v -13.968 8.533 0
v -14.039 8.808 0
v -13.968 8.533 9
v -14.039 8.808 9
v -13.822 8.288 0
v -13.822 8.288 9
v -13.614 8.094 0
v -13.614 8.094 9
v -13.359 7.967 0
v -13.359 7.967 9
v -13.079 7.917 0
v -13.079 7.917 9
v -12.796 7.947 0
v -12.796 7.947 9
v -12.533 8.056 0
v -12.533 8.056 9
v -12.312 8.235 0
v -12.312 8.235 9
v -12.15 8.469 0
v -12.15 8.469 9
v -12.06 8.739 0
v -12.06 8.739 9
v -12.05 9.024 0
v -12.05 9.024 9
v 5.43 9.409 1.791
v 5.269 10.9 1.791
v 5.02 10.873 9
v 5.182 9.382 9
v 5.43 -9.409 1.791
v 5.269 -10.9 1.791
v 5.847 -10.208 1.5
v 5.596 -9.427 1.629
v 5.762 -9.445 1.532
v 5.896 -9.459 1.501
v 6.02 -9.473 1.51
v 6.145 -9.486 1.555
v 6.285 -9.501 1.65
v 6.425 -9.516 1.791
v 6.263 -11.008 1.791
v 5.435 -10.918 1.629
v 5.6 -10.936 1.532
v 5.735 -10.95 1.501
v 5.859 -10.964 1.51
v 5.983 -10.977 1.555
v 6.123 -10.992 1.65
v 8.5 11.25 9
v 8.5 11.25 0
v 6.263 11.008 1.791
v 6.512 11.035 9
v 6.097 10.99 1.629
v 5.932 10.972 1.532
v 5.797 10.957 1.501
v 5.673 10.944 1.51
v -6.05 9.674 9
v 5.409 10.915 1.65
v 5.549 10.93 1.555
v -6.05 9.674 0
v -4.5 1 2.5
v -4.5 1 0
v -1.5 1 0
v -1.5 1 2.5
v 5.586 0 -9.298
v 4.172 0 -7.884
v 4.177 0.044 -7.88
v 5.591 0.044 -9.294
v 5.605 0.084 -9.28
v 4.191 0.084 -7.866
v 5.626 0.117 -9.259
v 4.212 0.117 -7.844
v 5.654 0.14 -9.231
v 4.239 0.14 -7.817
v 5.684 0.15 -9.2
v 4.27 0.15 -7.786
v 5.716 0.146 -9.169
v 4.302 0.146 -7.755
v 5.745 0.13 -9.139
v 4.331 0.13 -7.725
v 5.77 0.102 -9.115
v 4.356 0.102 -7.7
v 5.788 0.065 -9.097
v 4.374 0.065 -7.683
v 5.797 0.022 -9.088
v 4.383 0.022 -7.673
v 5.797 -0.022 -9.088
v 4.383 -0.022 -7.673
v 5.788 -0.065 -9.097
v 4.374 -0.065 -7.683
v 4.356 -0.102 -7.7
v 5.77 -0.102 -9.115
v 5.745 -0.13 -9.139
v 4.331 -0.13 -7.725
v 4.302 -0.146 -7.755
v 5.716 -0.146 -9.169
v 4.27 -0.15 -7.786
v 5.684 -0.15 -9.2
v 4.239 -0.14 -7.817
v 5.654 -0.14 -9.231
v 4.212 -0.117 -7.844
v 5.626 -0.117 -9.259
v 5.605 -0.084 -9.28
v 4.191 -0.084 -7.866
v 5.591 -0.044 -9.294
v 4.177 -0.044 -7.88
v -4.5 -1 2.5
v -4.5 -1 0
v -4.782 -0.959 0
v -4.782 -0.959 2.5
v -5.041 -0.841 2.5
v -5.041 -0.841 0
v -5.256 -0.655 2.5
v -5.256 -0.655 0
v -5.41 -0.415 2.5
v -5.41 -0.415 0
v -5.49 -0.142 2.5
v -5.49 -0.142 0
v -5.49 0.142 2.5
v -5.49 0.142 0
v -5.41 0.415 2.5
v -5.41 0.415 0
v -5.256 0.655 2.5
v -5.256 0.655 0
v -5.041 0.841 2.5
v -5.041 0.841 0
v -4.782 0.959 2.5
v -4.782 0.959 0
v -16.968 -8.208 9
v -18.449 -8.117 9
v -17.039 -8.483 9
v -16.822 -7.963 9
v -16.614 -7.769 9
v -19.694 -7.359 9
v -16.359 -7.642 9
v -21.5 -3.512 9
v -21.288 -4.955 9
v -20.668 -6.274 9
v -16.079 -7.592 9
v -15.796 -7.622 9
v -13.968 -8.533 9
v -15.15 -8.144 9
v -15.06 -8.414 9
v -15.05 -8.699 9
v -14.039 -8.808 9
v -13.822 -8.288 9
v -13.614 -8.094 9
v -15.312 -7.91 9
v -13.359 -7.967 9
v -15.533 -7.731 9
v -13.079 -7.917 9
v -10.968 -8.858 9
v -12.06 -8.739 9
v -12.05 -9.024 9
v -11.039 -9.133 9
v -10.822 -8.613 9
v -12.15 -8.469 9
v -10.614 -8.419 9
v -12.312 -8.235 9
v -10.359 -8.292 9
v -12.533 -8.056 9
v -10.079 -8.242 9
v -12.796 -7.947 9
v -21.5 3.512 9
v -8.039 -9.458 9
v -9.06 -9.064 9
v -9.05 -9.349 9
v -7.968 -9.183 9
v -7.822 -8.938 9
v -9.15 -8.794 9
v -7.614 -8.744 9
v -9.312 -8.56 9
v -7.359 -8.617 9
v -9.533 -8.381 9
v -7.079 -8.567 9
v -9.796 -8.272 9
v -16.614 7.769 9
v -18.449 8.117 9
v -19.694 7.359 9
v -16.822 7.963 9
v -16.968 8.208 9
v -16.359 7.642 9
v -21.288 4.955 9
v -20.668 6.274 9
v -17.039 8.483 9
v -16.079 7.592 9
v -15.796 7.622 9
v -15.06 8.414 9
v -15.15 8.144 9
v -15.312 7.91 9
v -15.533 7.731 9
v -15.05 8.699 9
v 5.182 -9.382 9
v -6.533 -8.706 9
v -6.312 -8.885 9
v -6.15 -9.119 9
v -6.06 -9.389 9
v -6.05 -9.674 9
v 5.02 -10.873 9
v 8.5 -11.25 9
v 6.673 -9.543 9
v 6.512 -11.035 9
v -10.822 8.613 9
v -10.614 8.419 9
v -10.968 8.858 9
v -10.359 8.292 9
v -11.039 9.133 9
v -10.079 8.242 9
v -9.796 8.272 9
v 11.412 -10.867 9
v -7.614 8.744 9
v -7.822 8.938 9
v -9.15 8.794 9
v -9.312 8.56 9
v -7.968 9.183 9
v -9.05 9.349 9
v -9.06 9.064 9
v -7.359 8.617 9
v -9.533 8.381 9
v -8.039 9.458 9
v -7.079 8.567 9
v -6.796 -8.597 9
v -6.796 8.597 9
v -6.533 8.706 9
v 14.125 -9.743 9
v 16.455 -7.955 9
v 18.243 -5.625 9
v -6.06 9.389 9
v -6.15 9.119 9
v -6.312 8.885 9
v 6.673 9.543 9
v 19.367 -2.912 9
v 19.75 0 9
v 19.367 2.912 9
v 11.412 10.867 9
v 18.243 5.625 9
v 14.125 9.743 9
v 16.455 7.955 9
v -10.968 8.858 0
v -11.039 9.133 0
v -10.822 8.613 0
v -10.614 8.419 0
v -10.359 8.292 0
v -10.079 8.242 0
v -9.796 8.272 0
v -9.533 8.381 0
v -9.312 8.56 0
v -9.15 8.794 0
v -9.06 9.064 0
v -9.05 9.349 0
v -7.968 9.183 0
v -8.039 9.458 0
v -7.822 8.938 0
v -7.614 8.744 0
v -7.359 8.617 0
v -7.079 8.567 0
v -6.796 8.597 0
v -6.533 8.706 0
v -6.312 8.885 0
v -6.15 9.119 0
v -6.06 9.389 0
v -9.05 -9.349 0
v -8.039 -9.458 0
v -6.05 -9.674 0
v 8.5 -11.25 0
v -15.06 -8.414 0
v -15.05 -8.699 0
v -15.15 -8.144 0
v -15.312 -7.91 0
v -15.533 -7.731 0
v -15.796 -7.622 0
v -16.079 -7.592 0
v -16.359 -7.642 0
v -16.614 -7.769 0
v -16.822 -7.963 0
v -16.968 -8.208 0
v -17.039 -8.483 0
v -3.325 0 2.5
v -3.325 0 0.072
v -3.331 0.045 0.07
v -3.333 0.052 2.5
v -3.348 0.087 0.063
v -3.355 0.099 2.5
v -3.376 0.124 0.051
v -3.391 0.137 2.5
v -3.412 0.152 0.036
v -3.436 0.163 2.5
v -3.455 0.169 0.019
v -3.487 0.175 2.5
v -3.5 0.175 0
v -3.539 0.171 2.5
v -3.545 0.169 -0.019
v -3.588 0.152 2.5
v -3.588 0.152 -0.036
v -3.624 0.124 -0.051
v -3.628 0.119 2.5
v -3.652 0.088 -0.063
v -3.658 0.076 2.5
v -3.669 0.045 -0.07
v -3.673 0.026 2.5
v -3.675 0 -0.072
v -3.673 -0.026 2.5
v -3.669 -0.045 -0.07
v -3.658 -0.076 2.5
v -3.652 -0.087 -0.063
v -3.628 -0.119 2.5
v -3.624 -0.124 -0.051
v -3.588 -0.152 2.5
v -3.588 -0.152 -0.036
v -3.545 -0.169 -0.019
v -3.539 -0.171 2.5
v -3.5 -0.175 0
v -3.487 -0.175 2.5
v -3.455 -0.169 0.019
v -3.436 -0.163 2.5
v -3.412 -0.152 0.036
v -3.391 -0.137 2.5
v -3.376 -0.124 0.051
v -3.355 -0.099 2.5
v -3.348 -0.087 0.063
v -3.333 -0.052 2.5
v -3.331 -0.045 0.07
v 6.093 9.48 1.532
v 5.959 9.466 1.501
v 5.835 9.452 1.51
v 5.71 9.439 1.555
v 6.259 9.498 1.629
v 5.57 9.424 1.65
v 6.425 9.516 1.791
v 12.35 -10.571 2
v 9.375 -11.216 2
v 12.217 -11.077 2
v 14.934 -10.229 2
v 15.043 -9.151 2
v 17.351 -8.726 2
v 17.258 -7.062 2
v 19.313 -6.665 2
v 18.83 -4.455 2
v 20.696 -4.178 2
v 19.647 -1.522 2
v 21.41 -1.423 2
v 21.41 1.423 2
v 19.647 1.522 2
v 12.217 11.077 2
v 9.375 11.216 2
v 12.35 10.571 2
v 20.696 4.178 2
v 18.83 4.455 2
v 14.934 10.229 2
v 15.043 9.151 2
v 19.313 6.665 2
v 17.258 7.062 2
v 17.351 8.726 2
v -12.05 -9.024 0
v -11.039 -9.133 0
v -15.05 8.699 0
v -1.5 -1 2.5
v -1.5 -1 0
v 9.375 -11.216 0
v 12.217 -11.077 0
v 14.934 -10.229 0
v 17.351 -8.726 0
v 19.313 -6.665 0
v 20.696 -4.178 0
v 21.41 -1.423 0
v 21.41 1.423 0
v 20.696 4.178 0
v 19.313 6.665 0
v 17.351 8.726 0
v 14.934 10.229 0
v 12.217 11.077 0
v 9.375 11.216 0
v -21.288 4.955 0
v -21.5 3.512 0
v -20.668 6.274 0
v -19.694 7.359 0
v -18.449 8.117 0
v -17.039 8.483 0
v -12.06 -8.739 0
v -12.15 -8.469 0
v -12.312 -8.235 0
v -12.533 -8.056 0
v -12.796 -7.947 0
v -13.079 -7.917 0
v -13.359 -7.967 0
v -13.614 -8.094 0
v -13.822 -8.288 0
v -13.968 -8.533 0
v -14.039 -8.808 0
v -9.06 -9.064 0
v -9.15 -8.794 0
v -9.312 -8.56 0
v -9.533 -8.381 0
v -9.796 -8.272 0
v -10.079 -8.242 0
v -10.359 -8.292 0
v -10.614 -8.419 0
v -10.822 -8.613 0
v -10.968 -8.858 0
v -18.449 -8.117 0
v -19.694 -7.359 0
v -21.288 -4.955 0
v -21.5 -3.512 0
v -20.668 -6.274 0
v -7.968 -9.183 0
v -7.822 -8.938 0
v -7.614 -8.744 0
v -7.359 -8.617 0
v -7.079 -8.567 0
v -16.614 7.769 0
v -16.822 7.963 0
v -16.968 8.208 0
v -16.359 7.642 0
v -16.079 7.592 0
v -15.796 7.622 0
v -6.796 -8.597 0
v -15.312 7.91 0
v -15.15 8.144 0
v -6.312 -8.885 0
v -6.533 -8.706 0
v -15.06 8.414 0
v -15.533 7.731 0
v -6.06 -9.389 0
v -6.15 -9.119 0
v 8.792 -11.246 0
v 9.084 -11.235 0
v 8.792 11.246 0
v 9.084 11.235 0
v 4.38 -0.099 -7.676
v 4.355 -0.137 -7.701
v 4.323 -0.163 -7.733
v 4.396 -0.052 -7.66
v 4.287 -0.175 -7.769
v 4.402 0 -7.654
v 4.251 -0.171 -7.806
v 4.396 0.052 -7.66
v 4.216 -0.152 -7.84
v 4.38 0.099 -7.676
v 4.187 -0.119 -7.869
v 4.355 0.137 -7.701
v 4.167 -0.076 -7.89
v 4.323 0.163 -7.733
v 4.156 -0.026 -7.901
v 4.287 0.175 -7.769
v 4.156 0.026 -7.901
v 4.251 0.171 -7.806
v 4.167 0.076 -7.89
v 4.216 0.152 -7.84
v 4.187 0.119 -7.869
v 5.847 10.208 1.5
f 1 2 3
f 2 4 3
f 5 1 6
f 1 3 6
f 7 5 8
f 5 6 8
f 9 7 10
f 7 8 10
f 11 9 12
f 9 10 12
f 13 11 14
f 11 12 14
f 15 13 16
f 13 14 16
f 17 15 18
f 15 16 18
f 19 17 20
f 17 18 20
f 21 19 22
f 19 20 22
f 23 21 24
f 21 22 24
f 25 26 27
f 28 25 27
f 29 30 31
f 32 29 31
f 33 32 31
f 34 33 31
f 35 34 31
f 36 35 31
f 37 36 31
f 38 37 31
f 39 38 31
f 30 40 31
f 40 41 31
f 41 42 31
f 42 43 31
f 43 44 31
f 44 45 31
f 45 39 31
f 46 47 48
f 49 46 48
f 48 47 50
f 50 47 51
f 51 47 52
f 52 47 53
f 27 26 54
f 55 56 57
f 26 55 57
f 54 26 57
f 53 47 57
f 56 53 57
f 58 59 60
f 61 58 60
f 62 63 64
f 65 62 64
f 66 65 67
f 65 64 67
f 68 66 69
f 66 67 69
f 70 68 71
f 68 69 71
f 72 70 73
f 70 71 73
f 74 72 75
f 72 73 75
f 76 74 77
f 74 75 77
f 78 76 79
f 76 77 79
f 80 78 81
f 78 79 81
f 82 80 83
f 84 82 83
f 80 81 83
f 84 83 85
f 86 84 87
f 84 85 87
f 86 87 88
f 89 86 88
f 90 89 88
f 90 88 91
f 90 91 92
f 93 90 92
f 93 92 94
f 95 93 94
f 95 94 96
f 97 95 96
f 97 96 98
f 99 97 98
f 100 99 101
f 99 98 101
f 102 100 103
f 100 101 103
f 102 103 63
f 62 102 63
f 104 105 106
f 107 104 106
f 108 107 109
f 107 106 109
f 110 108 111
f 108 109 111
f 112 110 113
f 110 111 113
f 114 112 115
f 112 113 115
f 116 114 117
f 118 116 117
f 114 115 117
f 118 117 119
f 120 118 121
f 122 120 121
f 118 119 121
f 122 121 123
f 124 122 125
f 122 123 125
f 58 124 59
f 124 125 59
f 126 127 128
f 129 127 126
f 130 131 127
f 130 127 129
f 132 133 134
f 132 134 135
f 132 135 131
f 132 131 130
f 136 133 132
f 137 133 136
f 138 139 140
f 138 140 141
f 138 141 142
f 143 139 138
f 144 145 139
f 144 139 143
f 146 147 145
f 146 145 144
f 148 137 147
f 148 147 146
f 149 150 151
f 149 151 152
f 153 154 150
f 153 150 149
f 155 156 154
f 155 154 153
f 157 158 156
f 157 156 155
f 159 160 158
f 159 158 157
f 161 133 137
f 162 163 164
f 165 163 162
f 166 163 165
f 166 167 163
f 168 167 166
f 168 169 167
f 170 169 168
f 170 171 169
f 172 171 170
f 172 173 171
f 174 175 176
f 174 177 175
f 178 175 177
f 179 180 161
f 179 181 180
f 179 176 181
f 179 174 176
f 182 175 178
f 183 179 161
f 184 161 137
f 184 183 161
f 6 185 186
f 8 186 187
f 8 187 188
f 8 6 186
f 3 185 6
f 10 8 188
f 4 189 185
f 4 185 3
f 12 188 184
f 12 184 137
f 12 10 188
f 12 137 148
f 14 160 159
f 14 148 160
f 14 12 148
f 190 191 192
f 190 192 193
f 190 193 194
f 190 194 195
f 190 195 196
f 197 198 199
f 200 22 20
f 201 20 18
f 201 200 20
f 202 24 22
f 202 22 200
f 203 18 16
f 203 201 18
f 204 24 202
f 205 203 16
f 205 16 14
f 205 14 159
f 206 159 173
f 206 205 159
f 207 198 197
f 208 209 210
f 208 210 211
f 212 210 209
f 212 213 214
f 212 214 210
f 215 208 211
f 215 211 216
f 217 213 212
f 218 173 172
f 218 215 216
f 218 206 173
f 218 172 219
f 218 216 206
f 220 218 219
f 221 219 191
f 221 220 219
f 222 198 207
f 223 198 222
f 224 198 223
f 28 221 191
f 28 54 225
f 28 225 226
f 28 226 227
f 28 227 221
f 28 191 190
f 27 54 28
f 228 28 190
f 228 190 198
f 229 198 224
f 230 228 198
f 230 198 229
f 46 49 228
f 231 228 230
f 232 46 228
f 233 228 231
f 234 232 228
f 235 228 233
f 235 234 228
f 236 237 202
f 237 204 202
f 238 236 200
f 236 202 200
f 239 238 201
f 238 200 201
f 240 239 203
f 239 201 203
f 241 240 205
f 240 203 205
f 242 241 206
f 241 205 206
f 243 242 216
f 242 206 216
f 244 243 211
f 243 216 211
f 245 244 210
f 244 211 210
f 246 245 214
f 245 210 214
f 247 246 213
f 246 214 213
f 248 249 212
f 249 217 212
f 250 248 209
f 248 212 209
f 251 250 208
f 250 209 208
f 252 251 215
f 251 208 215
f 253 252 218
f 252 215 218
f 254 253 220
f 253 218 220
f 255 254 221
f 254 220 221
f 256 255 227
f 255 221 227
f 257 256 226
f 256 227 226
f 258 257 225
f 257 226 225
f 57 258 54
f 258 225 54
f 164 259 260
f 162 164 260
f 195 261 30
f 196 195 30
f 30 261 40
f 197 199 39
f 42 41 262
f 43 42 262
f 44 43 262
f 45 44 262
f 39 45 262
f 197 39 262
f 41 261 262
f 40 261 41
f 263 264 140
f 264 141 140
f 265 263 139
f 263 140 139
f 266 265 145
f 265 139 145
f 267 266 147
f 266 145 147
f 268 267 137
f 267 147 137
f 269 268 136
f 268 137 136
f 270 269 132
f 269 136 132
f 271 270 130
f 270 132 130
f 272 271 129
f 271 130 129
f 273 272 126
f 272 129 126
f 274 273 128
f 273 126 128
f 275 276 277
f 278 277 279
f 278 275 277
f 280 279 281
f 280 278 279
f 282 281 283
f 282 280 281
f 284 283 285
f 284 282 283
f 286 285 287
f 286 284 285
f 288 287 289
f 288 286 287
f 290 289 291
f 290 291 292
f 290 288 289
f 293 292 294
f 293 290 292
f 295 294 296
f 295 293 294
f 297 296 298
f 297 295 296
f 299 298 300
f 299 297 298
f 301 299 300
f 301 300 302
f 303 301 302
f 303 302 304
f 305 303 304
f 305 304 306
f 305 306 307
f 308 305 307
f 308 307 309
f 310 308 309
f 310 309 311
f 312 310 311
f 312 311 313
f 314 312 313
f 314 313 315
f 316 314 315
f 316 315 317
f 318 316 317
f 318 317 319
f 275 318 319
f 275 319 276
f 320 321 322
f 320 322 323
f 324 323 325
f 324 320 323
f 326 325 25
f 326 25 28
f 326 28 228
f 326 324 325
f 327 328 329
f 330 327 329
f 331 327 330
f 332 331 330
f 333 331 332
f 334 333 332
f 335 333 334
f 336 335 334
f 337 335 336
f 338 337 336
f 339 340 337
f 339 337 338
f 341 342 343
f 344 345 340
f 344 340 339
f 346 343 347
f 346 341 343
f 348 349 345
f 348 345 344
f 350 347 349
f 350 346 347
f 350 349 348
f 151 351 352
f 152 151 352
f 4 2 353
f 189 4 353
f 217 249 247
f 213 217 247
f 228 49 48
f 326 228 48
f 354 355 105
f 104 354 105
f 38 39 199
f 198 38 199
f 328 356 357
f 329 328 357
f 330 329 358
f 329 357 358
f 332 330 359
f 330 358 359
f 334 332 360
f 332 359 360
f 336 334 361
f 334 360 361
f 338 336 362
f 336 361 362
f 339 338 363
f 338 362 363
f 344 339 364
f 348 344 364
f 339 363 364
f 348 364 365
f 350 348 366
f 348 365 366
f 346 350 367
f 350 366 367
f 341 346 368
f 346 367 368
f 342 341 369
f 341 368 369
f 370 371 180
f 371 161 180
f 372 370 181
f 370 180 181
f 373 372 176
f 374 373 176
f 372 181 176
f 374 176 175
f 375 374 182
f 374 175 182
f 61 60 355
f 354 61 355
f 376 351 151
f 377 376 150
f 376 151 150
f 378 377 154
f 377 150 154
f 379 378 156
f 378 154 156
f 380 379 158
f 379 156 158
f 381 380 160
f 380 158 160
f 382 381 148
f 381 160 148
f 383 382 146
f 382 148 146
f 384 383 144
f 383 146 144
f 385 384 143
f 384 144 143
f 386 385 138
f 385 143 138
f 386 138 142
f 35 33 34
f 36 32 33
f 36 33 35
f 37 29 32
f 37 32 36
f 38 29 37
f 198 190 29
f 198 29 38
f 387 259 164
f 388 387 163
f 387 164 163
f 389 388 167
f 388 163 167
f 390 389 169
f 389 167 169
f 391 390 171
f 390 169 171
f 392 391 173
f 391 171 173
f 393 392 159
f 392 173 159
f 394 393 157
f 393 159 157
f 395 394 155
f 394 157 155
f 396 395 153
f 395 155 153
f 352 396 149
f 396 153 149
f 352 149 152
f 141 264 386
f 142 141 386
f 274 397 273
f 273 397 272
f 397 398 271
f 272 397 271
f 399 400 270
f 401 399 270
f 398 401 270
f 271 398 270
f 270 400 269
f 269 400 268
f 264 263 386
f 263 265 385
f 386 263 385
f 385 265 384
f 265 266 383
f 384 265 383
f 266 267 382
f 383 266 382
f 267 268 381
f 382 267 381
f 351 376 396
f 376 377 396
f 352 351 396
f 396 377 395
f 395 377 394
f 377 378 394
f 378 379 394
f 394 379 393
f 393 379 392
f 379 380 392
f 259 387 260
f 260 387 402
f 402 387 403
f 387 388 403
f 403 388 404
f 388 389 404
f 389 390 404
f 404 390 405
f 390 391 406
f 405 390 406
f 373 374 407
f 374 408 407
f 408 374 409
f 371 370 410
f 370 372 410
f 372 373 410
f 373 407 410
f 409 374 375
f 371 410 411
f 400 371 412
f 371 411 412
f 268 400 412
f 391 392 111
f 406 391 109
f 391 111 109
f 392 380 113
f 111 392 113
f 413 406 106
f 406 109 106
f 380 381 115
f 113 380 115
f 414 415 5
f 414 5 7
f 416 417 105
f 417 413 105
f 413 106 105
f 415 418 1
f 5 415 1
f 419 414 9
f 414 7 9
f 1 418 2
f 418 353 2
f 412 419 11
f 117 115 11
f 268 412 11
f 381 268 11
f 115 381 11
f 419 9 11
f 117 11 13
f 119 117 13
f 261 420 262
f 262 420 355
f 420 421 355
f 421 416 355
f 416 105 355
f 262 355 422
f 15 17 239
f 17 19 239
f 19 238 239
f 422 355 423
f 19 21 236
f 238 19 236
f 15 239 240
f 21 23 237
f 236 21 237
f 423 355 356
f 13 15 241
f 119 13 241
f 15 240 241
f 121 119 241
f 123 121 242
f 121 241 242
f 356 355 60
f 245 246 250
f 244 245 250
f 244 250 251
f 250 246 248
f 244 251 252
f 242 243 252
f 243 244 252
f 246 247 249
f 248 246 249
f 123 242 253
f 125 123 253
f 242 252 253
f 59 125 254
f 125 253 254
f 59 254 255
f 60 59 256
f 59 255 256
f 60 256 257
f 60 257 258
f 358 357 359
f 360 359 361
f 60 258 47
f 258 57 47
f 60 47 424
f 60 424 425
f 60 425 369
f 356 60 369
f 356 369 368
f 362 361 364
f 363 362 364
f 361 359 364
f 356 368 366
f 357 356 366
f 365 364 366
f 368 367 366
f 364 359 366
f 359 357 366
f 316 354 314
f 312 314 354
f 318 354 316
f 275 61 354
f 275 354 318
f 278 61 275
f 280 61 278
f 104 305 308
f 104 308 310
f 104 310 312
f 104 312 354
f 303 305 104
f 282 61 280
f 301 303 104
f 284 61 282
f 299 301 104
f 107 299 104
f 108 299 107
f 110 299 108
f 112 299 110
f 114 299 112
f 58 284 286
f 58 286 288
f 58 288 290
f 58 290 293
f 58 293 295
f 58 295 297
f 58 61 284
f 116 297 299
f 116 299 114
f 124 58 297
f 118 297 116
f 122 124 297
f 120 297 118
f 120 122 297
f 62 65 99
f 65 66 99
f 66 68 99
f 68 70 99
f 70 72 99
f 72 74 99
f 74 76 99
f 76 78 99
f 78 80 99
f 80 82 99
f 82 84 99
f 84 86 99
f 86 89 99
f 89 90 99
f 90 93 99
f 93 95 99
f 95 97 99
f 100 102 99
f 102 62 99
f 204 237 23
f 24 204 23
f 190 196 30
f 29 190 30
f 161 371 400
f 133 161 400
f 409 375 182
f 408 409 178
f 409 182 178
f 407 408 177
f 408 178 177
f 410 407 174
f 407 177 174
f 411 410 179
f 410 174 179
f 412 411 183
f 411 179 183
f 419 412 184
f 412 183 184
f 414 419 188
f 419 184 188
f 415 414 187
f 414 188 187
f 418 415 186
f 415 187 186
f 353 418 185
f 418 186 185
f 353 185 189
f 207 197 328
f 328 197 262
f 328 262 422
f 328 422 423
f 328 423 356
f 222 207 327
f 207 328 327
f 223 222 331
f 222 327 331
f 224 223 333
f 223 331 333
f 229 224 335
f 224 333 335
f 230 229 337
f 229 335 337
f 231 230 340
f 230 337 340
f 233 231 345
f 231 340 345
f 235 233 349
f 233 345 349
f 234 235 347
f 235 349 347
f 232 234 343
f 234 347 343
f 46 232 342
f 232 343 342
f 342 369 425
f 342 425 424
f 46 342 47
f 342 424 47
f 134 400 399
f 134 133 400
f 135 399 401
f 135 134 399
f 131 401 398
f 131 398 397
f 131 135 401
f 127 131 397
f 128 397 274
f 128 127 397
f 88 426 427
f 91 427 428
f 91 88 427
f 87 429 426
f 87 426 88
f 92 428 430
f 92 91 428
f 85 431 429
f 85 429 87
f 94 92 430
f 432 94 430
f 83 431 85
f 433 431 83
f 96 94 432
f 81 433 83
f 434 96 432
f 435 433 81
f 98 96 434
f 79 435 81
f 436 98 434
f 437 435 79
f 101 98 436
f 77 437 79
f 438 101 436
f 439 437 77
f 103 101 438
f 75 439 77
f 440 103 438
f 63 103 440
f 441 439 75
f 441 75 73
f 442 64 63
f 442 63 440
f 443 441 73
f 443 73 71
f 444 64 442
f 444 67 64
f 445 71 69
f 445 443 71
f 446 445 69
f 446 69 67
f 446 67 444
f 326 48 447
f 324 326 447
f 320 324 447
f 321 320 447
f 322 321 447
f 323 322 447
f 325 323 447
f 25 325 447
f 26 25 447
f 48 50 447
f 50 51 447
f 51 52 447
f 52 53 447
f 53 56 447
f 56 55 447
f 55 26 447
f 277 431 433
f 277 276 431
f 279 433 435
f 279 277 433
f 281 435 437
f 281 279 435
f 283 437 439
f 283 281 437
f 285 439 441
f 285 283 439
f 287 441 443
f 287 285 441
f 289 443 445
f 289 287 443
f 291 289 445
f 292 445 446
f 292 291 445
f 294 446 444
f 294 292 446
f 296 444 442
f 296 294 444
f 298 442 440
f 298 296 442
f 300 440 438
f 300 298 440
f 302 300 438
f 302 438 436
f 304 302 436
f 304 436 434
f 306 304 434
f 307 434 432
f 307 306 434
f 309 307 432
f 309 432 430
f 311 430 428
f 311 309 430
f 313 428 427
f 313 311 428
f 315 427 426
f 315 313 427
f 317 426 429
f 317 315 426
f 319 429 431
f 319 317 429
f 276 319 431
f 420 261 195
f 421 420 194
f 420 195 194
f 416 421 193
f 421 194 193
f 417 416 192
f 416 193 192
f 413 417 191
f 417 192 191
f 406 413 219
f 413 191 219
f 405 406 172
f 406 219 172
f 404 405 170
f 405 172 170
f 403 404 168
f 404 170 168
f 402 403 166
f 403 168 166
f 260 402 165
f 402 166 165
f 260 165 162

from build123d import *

# Parameters (mm, degrees)
SENSOR_HEIGHT_DEPTH               = 9
SENSOR_LIP_HEIGHT_DEPTH           = 2
SHORT_SIDE_EDGE_ROUNDING_R        = 5
SENSOR_HOLES_R                    = 1
EXTRUDED_SENSOR_HOLES_DEPTH       = 26.880736079
BOTTOM_TRIANGLE_CUT_DEPTH         = 1.5
TOP_TRIANGLE_CUT_DEPTH            = 1.5
FILAMENT_HOLE_CUT_DEPTH           = 2.5
FILAMENT_PROFILE_R                = 0.175
SENSING_START                     = -2
SENSING_FILAMENT_R                = 0.175
SENSING_FILAMENT_R_2              = 0.15
SENSING_PORTION_OF_FILAMENT_DEPTH = 2


# Read off the part's stored shape, not the designer's step: Sensor Lip Height
with BuildPart() as part:
    # Basic Sensor Dimensions → Sensor Height (new body)
    with BuildSketch(Plane.XY):
        with BuildLine():
            Line((-21.5, 8), (-21.5, -8))
            Line((-21.5, -8), (8.5, -11.25))
            ThreePointArc((8.5, -11.25), (19.75, 0), (8.5, 11.25))
            Line((8.5, 11.25), (-21.5, 8))
        make_face()
    extrude(amount=SENSOR_HEIGHT_DEPTH)

    # Sensor Lip Height outline → Sensor Lip Height (add)
    with BuildSketch(Plane.XY):
        with BuildLine():
            ThreePointArc((9.375, -11.215920604), (21.5, 0), (9.375, 11.215920604))
            ThreePointArc((9.375, 11.215920604), (19.75, 0), (9.375, -11.215920604))
        make_face()
    extrude(amount=SENSOR_LIP_HEIGHT_DEPTH)

    # Short Side Edge Rounding
    short_side_edge_rounding_edges = [part.edges().sort_by_distance(p)[0] for p in [
        (-21.5, -8, 4.5),
        (-21.5, 8, 4.5),
    ]]
    fillet(short_side_edge_rounding_edges, radius=SHORT_SIDE_EDGE_ROUNDING_R)

    # Sensor Holes → Extruded Sensor Holes (cut, through all)
    with BuildSketch(Plane.XY.offset(9)):
        with Locations((-16.044332748, -8.591030619)):
            Circle(SENSOR_HOLES_R)
        with Locations((-13.044332748, -8.916030619)):
            Circle(SENSOR_HOLES_R)
        with Locations((-10.044332748, -9.241030619)):
            Circle(SENSOR_HOLES_R)
        with Locations((-7.044332748, -9.566030619)):
            Circle(SENSOR_HOLES_R)
        with Locations((-10.044332748, 9.241030619)):
            Circle(SENSOR_HOLES_R)
        with Locations((-7.044332748, 9.566030619)):
            Circle(SENSOR_HOLES_R)
        with Locations((-13.044332748, 8.916030619)):
            Circle(SENSOR_HOLES_R)
        with Locations((-16.044332748, 8.591030619)):
            Circle(SENSOR_HOLES_R)
    extrude(amount=-EXTRUDED_SENSOR_HOLES_DEPTH, mode=Mode.SUBTRACT)

    # Bottom Triangle → Bottom Triangle Cut (cut)
    with BuildSketch(Plane(origin=(-1.106012767, -10.209348617, 0), x_dir=(0.9941830955390242, -0.10770316868339427, 0), z_dir=(-0.10770316868339427, -0.9941830955390242, 0))):
        with BuildLine():
            Line((6.91221696, 1.5), (6.91221696, 9))
            Line((6.91221696, 9), (6.16221696, 9))
            Line((6.16221696, 9), (6.41221696, 1.790726708))
            add(Edge.make_bspline(
                [(6.41221696, 1.790726708), (6.66221696, 1.5), (6.91221696, 1.5)],
                knots=[0, 0, 0, 0.5, 0.5, 0.5], degree=2))
        make_face()
        with BuildLine():
            Line((7.41221696, 1.790726708), (7.66221696, 9))
            Line((7.66221696, 9), (6.91221696, 9))
            Line((6.91221696, 9), (6.91221696, 1.5))
            add(Edge.make_bspline(
                [(6.91221696, 1.5), (7.16221696, 1.5), (7.41221696, 1.790726708)],
                knots=[0.5, 0.5, 0.5, 1, 1, 1], degree=2))
        make_face()
    extrude(amount=-BOTTOM_TRIANGLE_CUT_DEPTH, mode=Mode.SUBTRACT)

    # Top Triangle → Top Triangle Cut (cut)
    with BuildSketch(Plane(origin=(-1.106012767, 10.209348617, 0), x_dir=(0.9941830955390242, 0.10770316868339432, 0), z_dir=(-0.10770316868339432, 0.9941830955390242, 0))):
        with BuildLine():
            Line((6.91221696, -9), (7.66221696, -9))
            Line((7.66221696, -9), (7.41221696, -1.790726708))
            add(Edge.make_bspline(
                [(6.91221696, -1.5), (7.16221696, -1.5), (7.41221696, -1.790726708)],
                knots=[0.5, 0.5, 0.5, 1, 1, 1], degree=2))
            Line((6.91221696, -1.5), (6.91221696, -9))
        make_face()
        with BuildLine():
            Line((6.16221696, -9), (6.91221696, -9))
            Line((6.91221696, -9), (6.91221696, -1.5))
            add(Edge.make_bspline(
                [(6.41221696, -1.790726708), (6.66221696, -1.5), (6.91221696, -1.5)],
                knots=[0, 0, 0, 0.5, 0.5, 0.5], degree=2))
            Line((6.41221696, -1.790726708), (6.16221696, -9))
        make_face()
    extrude(amount=-TOP_TRIANGLE_CUT_DEPTH, mode=Mode.SUBTRACT)

    # Filament Hole → Filament Hole Cut (cut)
    with BuildSketch(Plane(origin=(0, 0, 0), x_dir=(-1, 0, 0), z_dir=(0, 0, -1))):
        with BuildLine():
            Line((4.5, 1), (1.5, 1))
            Line((1.5, 1), (1.5, -1))
            Line((1.5, -1), (4.5, -1))
            ThreePointArc((4.5, -1), (5.5, 0), (4.5, 1))
        make_face()
    extrude(amount=-FILAMENT_HOLE_CUT_DEPTH, mode=Mode.SUBTRACT)

    # Filament: sweep along a curve in space
    with BuildLine() as filament_path:
        Line((-3.5, 0, 0), (-3.5, 0, 2.5))
        Line((-3.5, 0, 0), (5.692388155, 0, -9.192388155))
    # Filament profile (on start of the path) → Filament (sweep)
    with BuildSketch(Plane(origin=(5.692388155, 0, -9.192388155), x_dir=(0.7071067811865488, 0, 0.7071067811865464), z_dir=(-0.7071067811865464, 0, 0.7071067811865488))):
        Circle(FILAMENT_PROFILE_R)
    sweep(path=filament_path.line, transition=Transition.RIGHT)

    # Sensing Filament → Sensing Portion of Filament (cut)
    with BuildSketch(Plane(origin=(7.442388155, 0, -7.442388155), x_dir=(-0.7071067811865488, 0, -0.7071067811865462), z_dir=(0.7071067811865462, 0, -0.7071067811865488)).offset(SENSING_START)):
        with Locations((2.474873734, 0)):
            Circle(SENSING_FILAMENT_R)
        with Locations((2.474873734, 0)):
            Circle(SENSING_FILAMENT_R_2, mode=Mode.SUBTRACT)
    extrude(amount=SENSING_PORTION_OF_FILAMENT_DEPTH, mode=Mode.SUBTRACT)


solid = part.part
